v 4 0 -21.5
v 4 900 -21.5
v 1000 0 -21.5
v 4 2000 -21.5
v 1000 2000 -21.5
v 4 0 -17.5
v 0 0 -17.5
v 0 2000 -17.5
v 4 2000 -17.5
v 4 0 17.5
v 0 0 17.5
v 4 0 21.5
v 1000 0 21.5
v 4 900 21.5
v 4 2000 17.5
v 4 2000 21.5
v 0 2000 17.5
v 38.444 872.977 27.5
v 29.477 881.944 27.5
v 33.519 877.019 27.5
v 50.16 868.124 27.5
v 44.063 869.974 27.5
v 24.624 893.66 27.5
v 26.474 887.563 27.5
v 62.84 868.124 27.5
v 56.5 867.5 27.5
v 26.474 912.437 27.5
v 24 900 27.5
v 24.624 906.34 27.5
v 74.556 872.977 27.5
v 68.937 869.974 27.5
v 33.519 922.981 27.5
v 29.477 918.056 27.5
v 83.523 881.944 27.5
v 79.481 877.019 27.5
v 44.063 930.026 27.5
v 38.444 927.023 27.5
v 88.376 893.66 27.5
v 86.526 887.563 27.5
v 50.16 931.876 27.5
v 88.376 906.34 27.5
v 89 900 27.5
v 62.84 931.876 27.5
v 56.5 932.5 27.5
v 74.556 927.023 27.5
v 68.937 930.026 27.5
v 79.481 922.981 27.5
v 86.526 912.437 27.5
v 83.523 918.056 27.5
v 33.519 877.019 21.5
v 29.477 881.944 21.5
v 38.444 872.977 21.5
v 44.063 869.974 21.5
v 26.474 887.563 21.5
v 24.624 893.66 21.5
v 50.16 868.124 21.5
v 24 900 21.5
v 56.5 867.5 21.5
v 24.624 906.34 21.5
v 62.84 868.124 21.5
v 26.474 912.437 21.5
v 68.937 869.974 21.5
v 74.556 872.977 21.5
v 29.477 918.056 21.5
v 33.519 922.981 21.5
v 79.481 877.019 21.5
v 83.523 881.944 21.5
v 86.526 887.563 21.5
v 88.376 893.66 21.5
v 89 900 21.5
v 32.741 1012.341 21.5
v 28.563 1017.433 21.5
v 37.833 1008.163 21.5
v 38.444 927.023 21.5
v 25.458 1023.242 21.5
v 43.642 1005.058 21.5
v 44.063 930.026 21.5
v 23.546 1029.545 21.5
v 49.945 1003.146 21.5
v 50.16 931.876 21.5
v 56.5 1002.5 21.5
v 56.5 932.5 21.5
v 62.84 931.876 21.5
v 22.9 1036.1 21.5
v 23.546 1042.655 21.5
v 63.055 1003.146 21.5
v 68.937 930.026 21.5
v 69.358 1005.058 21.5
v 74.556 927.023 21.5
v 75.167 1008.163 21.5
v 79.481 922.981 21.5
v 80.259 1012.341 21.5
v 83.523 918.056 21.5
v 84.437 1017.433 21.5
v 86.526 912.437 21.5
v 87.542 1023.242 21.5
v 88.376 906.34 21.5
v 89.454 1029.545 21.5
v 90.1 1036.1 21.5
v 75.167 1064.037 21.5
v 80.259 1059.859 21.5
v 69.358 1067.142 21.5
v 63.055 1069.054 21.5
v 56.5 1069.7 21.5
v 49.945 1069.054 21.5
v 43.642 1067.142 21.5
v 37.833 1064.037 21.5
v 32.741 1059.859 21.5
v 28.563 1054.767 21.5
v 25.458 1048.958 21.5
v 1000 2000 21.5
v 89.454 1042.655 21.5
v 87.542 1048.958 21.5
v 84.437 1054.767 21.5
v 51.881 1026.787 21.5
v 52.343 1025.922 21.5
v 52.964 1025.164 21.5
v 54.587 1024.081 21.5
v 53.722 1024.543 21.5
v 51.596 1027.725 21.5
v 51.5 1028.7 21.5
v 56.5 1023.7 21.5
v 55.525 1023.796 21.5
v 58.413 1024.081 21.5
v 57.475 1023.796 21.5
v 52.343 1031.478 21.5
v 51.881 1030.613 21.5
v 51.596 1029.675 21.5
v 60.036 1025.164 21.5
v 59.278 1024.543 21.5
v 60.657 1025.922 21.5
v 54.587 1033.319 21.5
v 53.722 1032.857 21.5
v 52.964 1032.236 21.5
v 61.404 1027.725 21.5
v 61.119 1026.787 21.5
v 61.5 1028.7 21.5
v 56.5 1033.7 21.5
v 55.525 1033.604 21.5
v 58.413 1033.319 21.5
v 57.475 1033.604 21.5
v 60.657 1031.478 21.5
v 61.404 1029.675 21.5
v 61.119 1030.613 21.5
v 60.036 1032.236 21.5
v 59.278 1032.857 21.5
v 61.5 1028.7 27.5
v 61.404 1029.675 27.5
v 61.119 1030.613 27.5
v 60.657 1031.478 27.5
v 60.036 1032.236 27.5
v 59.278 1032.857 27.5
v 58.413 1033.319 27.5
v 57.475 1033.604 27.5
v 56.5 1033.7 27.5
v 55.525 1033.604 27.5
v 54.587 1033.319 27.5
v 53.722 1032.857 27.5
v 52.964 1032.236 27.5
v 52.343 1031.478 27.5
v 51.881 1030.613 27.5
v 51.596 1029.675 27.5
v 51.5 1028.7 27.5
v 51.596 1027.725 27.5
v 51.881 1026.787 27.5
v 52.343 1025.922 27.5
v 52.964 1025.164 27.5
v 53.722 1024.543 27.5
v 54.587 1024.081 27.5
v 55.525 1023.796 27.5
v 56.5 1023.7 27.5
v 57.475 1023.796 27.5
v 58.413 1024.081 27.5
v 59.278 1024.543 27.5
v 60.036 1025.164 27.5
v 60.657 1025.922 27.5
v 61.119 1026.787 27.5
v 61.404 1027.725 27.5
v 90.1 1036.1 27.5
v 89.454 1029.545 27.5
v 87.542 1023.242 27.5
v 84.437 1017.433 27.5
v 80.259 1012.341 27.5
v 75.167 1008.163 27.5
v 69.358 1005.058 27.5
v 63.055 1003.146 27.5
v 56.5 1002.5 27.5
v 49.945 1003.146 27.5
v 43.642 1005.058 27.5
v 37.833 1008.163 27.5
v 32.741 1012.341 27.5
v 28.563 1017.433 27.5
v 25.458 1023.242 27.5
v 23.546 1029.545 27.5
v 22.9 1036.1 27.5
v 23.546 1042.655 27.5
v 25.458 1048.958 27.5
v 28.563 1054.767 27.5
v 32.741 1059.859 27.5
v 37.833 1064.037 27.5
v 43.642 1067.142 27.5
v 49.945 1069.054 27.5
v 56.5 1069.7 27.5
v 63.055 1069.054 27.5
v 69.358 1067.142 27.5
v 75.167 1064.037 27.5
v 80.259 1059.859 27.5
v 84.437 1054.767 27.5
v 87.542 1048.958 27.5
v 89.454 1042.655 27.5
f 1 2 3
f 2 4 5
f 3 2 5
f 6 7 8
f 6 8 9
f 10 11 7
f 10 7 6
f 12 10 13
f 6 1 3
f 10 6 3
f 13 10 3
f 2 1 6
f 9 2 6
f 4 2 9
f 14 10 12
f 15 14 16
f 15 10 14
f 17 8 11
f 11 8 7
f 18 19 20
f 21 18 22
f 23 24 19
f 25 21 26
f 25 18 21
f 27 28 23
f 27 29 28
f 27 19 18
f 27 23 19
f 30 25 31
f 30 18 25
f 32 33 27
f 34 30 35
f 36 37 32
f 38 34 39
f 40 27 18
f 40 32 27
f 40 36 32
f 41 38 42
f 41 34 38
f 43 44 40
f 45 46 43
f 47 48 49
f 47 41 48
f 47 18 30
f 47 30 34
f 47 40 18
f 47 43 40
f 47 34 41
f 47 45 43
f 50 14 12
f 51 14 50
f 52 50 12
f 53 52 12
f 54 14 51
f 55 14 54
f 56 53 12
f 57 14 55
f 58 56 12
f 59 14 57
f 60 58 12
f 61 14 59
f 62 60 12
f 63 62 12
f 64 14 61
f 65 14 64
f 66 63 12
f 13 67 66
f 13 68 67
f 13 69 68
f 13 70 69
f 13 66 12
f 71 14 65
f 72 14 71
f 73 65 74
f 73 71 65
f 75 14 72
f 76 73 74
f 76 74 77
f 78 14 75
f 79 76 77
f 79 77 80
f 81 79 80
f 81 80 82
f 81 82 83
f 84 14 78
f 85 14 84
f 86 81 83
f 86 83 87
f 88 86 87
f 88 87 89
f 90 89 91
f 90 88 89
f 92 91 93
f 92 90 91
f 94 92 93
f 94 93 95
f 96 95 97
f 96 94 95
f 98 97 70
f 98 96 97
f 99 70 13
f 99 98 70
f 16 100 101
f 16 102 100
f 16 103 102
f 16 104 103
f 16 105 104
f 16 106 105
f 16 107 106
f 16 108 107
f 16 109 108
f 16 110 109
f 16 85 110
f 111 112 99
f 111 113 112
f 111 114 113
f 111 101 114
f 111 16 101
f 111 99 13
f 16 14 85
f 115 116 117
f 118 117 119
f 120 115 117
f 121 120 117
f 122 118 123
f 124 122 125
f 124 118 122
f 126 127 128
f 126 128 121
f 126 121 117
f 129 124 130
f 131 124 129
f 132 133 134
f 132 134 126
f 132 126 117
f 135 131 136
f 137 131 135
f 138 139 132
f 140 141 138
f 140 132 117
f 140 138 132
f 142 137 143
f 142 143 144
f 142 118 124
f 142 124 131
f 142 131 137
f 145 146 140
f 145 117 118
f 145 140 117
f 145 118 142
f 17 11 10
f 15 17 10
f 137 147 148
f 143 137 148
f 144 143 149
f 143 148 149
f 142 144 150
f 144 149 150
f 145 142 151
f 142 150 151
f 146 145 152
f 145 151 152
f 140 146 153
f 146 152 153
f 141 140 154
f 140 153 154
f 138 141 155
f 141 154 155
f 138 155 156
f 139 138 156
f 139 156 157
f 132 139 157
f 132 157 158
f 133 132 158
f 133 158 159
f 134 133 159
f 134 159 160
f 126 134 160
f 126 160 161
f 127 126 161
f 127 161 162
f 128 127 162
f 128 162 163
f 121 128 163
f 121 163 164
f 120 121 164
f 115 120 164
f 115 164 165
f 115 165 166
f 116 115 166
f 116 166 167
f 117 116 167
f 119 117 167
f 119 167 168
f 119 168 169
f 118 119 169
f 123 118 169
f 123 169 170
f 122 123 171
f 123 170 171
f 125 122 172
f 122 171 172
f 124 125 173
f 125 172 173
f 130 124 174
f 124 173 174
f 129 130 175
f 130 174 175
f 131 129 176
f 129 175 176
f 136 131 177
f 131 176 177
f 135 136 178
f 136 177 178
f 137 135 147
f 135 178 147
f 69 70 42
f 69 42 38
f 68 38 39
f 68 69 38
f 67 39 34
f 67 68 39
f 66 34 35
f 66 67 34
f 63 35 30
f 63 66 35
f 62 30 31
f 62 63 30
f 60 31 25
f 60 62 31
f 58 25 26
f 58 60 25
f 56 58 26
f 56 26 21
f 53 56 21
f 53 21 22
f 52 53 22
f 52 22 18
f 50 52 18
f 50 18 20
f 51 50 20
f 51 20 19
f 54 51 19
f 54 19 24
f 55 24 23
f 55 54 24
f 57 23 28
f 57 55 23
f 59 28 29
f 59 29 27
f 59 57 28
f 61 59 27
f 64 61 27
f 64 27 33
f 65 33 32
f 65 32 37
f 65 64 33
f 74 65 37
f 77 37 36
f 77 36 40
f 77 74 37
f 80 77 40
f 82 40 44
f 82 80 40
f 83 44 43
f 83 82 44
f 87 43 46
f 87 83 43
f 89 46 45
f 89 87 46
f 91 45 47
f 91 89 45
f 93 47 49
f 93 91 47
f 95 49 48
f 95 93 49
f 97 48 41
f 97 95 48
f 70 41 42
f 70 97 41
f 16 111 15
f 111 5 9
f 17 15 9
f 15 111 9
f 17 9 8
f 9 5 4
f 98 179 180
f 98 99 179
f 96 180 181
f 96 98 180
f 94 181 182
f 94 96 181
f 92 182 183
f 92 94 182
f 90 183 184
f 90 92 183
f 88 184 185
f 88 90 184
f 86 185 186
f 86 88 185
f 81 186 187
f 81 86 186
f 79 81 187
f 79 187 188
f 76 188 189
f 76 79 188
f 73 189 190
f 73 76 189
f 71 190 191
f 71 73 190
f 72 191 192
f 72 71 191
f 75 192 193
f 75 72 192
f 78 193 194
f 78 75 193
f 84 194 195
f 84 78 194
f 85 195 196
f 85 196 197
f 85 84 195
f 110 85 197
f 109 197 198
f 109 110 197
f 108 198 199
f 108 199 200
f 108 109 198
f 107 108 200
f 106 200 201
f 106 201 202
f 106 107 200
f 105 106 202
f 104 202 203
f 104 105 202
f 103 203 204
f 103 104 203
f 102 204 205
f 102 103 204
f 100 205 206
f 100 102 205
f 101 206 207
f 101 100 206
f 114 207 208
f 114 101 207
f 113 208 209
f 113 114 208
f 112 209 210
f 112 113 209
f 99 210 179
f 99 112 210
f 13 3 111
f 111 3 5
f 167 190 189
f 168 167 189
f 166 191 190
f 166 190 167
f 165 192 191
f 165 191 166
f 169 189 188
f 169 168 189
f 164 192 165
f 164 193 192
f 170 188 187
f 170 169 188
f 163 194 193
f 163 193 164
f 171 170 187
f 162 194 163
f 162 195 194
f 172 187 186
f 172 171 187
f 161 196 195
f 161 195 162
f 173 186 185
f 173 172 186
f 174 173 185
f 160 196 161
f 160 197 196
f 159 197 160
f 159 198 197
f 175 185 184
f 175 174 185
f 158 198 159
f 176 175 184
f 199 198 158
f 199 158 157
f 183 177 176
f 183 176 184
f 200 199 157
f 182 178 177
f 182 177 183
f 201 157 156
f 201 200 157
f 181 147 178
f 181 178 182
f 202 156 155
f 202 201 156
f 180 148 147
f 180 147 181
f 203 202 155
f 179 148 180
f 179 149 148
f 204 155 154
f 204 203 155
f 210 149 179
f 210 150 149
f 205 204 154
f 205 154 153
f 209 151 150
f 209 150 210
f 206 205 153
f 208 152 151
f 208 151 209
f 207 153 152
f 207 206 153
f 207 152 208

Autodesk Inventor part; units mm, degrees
ref_plane "YZ Plane" through (0, 0, 0) normal (1, 0, 0) x (0, 1, 0)
ref_plane "XZ Plane" through (0, 0, 0) normal (0, 1, 0) x (-1, 0, 0)
ref_plane "XY Plane" through (0, 0, 0) normal (0, 0, 1) x (1, 0, 0)
sketch "Sketch1" plane through (0, 0, 0) normal (0, 0, 1) x (1, 0, 0)
  line L0 (0, 0) -> (1000, 0)
  line L1 (1000, 0) -> (1000, 2000)
  line L2 (1000, 2000) -> (0, 2000)
  line L3 (0, 2000) -> (0, 0)
  line L4 (0, 0) -> (4, 0)
  line L5 (0, 0) -> (4, 0) construction
  line L6 (4, 0) -> (4, 2000)
  line L7 (4, 0) -> (4, 900)
  line L8 (4, 900) -> (24, 900)
  line L9 (24, 900) -> (56.5, 900)
  circle A0 centre (56.5, 900) radius 32.5
  line L10 (56.5, 932.5) -> (56.5, 1002.5)
  line L11 (56.5, 1002.5) -> (56.5, 1036.1)
  circle A1 centre (56.5, 1036.1) radius 33.6
  line L12 (56.5, 1069.7) -> (56.5, 1037.7)
  line L13 (56.5, 1037.7) -> (56.5, 1064.7)
  line L14 (56.5, 1064.7) -> (56.5, 1028.7)
  line L15 (56.5, 1028.7) -> (56.5, 1010.7)
  line L16 (56.5, 1010.7) -> (58.505, 1010.7)
  line L17 (56.5, 1064.7) -> (58.505, 1064.7)
  line L18 (60.4989, 1062.8571) -> (63.008, 1031.0205)
  line L19 (60.478, 1012.372) -> (62.8086, 1026.3917)
  arc A2 (62.8086, 1026.3917) -> (63.008, 1031.0205) centre (43.9839, 1029.5211) ccw
  arc A3 (60.4989, 1062.8571) -> (58.505, 1064.7) centre (58.505, 1062.7) ccw
  arc A4 (58.505, 1010.7) -> (60.478, 1012.372) centre (58.505, 1012.7) ccw
  line L20 (63.0493, 1028.7) -> (56.5, 1028.7)
  circle A5 centre (56.5, 1028.7) radius 5
  point P0 (60.2, 1010.7)
  point P1 (60.3536, 1064.7)
  point P2 (49.8, 1028.7)
  dimension "d11" = 65
  dimension "d0" = 1000
  dimension "d1" = 2000
  dimension "d2" = 4
  dimension "d8" = 900
  dimension "d9" = 20
  dimension "d10" = 32.5
  dimension "d12" = 70
  dimension "d13" = 33.6
  dimension "d24" = 32
  dimension "d25" = 27
  dimension "d26" = 36
  dimension "d27" = 18
  dimension "d28" = 3.7
  dimension "d31" = 2
  dimension "d32" = 6.5493
  dimension "d33" = 10
extrude "Extrusion1" add sketch "Sketch1" along normal mid plane 43 contours A1 L12 L14 L11 A5 | L11 L16 A4 L19 A2 L18 A3 L17 L12 A1 | A0 | L6 L2 L1 L0 | L11 A5 L20 A2 L19 A4 L16 | A5 L11 | L11 L20 A5 | L17 A3 L18 A2 L20 A5 L11 L14 L12 | L11 A5 L20
extrude "Extrusion2" add sketch "Sketch1" along normal mid plane 35 contours L3 L2 L6 L0
extrude "Extrusion3" add sketch "Sketch1" along normal blind 6 from surface at 21.5 contours A1 L12 L14 L11 A5 | L11 L16 A4 L19 A2 L18 A3 L17 L12 A1 | A0 | L11 A5 L20 A2 L19 A4 L16 | A5 L11 | L11 L20 A5 | L17 A3 L18 A2 L20 A5 L11 L14 L12 | L11 A5 L20
sketch "Sketch2" plane through (0, 0, 17.5) normal (-1, 0, 0) x (0, 0, 1)
  line L0 (-35, 0) -> (-35, 2000) projected
  line L1 (-17.5, 0) -> (1182.5, 0) construction
  line L2 (10, 1069.7) -> (10, 1002.5) projected
  line L3 (10, 1036.1) -> (-17.5, 1036.1)
  line L4 (10, 932.5) -> (10, 867.5) projected
  line L5 (10, 900) -> (-17.5, 900)
  line L6 (-27.5, 877.5) -> (-7.5, 877.5)
  line L7 (-7.5, 877.5) -> (-7.5, 922.5)
  line L8 (-7.5, 922.5) -> (-27.5, 922.5)
  line L9 (-27.5, 922.5) -> (-27.5, 877.5)
  line L10 (-27.5, 877.5) -> (-7.5, 922.5) construction
  line L11 (-7.5, 877.5) -> (-27.5, 922.5) construction
  line L12 (-17.5, 0) -> (-17.5, 2000)
  line L13 (10, 932.5) -> (-17.5, 932.5)
  line L14 (-27.5, 1011.1) -> (-7.5, 1011.1)
  line L15 (-7.5, 1011.1) -> (-7.5, 1061.1)
  line L16 (-7.5, 1061.1) -> (-27.5, 1061.1)
  line L17 (-27.5, 1061.1) -> (-27.5, 1011.1)
  line L18 (-27.5, 1011.1) -> (-7.5, 1061.1) construction
  line L19 (-7.5, 1011.1) -> (-27.5, 1061.1) construction
  dimension "d20" = 20
  dimension "d21" = 45
  dimension "d22" = 20
  dimension "d23" = 50
extrude "Extrusion4" cut sketch "Sketch1" against normal blind 6 from surface at 27.5 contours A5 L11 | L11 L20 A5 | L11 A5 L20
properties part number "door"
